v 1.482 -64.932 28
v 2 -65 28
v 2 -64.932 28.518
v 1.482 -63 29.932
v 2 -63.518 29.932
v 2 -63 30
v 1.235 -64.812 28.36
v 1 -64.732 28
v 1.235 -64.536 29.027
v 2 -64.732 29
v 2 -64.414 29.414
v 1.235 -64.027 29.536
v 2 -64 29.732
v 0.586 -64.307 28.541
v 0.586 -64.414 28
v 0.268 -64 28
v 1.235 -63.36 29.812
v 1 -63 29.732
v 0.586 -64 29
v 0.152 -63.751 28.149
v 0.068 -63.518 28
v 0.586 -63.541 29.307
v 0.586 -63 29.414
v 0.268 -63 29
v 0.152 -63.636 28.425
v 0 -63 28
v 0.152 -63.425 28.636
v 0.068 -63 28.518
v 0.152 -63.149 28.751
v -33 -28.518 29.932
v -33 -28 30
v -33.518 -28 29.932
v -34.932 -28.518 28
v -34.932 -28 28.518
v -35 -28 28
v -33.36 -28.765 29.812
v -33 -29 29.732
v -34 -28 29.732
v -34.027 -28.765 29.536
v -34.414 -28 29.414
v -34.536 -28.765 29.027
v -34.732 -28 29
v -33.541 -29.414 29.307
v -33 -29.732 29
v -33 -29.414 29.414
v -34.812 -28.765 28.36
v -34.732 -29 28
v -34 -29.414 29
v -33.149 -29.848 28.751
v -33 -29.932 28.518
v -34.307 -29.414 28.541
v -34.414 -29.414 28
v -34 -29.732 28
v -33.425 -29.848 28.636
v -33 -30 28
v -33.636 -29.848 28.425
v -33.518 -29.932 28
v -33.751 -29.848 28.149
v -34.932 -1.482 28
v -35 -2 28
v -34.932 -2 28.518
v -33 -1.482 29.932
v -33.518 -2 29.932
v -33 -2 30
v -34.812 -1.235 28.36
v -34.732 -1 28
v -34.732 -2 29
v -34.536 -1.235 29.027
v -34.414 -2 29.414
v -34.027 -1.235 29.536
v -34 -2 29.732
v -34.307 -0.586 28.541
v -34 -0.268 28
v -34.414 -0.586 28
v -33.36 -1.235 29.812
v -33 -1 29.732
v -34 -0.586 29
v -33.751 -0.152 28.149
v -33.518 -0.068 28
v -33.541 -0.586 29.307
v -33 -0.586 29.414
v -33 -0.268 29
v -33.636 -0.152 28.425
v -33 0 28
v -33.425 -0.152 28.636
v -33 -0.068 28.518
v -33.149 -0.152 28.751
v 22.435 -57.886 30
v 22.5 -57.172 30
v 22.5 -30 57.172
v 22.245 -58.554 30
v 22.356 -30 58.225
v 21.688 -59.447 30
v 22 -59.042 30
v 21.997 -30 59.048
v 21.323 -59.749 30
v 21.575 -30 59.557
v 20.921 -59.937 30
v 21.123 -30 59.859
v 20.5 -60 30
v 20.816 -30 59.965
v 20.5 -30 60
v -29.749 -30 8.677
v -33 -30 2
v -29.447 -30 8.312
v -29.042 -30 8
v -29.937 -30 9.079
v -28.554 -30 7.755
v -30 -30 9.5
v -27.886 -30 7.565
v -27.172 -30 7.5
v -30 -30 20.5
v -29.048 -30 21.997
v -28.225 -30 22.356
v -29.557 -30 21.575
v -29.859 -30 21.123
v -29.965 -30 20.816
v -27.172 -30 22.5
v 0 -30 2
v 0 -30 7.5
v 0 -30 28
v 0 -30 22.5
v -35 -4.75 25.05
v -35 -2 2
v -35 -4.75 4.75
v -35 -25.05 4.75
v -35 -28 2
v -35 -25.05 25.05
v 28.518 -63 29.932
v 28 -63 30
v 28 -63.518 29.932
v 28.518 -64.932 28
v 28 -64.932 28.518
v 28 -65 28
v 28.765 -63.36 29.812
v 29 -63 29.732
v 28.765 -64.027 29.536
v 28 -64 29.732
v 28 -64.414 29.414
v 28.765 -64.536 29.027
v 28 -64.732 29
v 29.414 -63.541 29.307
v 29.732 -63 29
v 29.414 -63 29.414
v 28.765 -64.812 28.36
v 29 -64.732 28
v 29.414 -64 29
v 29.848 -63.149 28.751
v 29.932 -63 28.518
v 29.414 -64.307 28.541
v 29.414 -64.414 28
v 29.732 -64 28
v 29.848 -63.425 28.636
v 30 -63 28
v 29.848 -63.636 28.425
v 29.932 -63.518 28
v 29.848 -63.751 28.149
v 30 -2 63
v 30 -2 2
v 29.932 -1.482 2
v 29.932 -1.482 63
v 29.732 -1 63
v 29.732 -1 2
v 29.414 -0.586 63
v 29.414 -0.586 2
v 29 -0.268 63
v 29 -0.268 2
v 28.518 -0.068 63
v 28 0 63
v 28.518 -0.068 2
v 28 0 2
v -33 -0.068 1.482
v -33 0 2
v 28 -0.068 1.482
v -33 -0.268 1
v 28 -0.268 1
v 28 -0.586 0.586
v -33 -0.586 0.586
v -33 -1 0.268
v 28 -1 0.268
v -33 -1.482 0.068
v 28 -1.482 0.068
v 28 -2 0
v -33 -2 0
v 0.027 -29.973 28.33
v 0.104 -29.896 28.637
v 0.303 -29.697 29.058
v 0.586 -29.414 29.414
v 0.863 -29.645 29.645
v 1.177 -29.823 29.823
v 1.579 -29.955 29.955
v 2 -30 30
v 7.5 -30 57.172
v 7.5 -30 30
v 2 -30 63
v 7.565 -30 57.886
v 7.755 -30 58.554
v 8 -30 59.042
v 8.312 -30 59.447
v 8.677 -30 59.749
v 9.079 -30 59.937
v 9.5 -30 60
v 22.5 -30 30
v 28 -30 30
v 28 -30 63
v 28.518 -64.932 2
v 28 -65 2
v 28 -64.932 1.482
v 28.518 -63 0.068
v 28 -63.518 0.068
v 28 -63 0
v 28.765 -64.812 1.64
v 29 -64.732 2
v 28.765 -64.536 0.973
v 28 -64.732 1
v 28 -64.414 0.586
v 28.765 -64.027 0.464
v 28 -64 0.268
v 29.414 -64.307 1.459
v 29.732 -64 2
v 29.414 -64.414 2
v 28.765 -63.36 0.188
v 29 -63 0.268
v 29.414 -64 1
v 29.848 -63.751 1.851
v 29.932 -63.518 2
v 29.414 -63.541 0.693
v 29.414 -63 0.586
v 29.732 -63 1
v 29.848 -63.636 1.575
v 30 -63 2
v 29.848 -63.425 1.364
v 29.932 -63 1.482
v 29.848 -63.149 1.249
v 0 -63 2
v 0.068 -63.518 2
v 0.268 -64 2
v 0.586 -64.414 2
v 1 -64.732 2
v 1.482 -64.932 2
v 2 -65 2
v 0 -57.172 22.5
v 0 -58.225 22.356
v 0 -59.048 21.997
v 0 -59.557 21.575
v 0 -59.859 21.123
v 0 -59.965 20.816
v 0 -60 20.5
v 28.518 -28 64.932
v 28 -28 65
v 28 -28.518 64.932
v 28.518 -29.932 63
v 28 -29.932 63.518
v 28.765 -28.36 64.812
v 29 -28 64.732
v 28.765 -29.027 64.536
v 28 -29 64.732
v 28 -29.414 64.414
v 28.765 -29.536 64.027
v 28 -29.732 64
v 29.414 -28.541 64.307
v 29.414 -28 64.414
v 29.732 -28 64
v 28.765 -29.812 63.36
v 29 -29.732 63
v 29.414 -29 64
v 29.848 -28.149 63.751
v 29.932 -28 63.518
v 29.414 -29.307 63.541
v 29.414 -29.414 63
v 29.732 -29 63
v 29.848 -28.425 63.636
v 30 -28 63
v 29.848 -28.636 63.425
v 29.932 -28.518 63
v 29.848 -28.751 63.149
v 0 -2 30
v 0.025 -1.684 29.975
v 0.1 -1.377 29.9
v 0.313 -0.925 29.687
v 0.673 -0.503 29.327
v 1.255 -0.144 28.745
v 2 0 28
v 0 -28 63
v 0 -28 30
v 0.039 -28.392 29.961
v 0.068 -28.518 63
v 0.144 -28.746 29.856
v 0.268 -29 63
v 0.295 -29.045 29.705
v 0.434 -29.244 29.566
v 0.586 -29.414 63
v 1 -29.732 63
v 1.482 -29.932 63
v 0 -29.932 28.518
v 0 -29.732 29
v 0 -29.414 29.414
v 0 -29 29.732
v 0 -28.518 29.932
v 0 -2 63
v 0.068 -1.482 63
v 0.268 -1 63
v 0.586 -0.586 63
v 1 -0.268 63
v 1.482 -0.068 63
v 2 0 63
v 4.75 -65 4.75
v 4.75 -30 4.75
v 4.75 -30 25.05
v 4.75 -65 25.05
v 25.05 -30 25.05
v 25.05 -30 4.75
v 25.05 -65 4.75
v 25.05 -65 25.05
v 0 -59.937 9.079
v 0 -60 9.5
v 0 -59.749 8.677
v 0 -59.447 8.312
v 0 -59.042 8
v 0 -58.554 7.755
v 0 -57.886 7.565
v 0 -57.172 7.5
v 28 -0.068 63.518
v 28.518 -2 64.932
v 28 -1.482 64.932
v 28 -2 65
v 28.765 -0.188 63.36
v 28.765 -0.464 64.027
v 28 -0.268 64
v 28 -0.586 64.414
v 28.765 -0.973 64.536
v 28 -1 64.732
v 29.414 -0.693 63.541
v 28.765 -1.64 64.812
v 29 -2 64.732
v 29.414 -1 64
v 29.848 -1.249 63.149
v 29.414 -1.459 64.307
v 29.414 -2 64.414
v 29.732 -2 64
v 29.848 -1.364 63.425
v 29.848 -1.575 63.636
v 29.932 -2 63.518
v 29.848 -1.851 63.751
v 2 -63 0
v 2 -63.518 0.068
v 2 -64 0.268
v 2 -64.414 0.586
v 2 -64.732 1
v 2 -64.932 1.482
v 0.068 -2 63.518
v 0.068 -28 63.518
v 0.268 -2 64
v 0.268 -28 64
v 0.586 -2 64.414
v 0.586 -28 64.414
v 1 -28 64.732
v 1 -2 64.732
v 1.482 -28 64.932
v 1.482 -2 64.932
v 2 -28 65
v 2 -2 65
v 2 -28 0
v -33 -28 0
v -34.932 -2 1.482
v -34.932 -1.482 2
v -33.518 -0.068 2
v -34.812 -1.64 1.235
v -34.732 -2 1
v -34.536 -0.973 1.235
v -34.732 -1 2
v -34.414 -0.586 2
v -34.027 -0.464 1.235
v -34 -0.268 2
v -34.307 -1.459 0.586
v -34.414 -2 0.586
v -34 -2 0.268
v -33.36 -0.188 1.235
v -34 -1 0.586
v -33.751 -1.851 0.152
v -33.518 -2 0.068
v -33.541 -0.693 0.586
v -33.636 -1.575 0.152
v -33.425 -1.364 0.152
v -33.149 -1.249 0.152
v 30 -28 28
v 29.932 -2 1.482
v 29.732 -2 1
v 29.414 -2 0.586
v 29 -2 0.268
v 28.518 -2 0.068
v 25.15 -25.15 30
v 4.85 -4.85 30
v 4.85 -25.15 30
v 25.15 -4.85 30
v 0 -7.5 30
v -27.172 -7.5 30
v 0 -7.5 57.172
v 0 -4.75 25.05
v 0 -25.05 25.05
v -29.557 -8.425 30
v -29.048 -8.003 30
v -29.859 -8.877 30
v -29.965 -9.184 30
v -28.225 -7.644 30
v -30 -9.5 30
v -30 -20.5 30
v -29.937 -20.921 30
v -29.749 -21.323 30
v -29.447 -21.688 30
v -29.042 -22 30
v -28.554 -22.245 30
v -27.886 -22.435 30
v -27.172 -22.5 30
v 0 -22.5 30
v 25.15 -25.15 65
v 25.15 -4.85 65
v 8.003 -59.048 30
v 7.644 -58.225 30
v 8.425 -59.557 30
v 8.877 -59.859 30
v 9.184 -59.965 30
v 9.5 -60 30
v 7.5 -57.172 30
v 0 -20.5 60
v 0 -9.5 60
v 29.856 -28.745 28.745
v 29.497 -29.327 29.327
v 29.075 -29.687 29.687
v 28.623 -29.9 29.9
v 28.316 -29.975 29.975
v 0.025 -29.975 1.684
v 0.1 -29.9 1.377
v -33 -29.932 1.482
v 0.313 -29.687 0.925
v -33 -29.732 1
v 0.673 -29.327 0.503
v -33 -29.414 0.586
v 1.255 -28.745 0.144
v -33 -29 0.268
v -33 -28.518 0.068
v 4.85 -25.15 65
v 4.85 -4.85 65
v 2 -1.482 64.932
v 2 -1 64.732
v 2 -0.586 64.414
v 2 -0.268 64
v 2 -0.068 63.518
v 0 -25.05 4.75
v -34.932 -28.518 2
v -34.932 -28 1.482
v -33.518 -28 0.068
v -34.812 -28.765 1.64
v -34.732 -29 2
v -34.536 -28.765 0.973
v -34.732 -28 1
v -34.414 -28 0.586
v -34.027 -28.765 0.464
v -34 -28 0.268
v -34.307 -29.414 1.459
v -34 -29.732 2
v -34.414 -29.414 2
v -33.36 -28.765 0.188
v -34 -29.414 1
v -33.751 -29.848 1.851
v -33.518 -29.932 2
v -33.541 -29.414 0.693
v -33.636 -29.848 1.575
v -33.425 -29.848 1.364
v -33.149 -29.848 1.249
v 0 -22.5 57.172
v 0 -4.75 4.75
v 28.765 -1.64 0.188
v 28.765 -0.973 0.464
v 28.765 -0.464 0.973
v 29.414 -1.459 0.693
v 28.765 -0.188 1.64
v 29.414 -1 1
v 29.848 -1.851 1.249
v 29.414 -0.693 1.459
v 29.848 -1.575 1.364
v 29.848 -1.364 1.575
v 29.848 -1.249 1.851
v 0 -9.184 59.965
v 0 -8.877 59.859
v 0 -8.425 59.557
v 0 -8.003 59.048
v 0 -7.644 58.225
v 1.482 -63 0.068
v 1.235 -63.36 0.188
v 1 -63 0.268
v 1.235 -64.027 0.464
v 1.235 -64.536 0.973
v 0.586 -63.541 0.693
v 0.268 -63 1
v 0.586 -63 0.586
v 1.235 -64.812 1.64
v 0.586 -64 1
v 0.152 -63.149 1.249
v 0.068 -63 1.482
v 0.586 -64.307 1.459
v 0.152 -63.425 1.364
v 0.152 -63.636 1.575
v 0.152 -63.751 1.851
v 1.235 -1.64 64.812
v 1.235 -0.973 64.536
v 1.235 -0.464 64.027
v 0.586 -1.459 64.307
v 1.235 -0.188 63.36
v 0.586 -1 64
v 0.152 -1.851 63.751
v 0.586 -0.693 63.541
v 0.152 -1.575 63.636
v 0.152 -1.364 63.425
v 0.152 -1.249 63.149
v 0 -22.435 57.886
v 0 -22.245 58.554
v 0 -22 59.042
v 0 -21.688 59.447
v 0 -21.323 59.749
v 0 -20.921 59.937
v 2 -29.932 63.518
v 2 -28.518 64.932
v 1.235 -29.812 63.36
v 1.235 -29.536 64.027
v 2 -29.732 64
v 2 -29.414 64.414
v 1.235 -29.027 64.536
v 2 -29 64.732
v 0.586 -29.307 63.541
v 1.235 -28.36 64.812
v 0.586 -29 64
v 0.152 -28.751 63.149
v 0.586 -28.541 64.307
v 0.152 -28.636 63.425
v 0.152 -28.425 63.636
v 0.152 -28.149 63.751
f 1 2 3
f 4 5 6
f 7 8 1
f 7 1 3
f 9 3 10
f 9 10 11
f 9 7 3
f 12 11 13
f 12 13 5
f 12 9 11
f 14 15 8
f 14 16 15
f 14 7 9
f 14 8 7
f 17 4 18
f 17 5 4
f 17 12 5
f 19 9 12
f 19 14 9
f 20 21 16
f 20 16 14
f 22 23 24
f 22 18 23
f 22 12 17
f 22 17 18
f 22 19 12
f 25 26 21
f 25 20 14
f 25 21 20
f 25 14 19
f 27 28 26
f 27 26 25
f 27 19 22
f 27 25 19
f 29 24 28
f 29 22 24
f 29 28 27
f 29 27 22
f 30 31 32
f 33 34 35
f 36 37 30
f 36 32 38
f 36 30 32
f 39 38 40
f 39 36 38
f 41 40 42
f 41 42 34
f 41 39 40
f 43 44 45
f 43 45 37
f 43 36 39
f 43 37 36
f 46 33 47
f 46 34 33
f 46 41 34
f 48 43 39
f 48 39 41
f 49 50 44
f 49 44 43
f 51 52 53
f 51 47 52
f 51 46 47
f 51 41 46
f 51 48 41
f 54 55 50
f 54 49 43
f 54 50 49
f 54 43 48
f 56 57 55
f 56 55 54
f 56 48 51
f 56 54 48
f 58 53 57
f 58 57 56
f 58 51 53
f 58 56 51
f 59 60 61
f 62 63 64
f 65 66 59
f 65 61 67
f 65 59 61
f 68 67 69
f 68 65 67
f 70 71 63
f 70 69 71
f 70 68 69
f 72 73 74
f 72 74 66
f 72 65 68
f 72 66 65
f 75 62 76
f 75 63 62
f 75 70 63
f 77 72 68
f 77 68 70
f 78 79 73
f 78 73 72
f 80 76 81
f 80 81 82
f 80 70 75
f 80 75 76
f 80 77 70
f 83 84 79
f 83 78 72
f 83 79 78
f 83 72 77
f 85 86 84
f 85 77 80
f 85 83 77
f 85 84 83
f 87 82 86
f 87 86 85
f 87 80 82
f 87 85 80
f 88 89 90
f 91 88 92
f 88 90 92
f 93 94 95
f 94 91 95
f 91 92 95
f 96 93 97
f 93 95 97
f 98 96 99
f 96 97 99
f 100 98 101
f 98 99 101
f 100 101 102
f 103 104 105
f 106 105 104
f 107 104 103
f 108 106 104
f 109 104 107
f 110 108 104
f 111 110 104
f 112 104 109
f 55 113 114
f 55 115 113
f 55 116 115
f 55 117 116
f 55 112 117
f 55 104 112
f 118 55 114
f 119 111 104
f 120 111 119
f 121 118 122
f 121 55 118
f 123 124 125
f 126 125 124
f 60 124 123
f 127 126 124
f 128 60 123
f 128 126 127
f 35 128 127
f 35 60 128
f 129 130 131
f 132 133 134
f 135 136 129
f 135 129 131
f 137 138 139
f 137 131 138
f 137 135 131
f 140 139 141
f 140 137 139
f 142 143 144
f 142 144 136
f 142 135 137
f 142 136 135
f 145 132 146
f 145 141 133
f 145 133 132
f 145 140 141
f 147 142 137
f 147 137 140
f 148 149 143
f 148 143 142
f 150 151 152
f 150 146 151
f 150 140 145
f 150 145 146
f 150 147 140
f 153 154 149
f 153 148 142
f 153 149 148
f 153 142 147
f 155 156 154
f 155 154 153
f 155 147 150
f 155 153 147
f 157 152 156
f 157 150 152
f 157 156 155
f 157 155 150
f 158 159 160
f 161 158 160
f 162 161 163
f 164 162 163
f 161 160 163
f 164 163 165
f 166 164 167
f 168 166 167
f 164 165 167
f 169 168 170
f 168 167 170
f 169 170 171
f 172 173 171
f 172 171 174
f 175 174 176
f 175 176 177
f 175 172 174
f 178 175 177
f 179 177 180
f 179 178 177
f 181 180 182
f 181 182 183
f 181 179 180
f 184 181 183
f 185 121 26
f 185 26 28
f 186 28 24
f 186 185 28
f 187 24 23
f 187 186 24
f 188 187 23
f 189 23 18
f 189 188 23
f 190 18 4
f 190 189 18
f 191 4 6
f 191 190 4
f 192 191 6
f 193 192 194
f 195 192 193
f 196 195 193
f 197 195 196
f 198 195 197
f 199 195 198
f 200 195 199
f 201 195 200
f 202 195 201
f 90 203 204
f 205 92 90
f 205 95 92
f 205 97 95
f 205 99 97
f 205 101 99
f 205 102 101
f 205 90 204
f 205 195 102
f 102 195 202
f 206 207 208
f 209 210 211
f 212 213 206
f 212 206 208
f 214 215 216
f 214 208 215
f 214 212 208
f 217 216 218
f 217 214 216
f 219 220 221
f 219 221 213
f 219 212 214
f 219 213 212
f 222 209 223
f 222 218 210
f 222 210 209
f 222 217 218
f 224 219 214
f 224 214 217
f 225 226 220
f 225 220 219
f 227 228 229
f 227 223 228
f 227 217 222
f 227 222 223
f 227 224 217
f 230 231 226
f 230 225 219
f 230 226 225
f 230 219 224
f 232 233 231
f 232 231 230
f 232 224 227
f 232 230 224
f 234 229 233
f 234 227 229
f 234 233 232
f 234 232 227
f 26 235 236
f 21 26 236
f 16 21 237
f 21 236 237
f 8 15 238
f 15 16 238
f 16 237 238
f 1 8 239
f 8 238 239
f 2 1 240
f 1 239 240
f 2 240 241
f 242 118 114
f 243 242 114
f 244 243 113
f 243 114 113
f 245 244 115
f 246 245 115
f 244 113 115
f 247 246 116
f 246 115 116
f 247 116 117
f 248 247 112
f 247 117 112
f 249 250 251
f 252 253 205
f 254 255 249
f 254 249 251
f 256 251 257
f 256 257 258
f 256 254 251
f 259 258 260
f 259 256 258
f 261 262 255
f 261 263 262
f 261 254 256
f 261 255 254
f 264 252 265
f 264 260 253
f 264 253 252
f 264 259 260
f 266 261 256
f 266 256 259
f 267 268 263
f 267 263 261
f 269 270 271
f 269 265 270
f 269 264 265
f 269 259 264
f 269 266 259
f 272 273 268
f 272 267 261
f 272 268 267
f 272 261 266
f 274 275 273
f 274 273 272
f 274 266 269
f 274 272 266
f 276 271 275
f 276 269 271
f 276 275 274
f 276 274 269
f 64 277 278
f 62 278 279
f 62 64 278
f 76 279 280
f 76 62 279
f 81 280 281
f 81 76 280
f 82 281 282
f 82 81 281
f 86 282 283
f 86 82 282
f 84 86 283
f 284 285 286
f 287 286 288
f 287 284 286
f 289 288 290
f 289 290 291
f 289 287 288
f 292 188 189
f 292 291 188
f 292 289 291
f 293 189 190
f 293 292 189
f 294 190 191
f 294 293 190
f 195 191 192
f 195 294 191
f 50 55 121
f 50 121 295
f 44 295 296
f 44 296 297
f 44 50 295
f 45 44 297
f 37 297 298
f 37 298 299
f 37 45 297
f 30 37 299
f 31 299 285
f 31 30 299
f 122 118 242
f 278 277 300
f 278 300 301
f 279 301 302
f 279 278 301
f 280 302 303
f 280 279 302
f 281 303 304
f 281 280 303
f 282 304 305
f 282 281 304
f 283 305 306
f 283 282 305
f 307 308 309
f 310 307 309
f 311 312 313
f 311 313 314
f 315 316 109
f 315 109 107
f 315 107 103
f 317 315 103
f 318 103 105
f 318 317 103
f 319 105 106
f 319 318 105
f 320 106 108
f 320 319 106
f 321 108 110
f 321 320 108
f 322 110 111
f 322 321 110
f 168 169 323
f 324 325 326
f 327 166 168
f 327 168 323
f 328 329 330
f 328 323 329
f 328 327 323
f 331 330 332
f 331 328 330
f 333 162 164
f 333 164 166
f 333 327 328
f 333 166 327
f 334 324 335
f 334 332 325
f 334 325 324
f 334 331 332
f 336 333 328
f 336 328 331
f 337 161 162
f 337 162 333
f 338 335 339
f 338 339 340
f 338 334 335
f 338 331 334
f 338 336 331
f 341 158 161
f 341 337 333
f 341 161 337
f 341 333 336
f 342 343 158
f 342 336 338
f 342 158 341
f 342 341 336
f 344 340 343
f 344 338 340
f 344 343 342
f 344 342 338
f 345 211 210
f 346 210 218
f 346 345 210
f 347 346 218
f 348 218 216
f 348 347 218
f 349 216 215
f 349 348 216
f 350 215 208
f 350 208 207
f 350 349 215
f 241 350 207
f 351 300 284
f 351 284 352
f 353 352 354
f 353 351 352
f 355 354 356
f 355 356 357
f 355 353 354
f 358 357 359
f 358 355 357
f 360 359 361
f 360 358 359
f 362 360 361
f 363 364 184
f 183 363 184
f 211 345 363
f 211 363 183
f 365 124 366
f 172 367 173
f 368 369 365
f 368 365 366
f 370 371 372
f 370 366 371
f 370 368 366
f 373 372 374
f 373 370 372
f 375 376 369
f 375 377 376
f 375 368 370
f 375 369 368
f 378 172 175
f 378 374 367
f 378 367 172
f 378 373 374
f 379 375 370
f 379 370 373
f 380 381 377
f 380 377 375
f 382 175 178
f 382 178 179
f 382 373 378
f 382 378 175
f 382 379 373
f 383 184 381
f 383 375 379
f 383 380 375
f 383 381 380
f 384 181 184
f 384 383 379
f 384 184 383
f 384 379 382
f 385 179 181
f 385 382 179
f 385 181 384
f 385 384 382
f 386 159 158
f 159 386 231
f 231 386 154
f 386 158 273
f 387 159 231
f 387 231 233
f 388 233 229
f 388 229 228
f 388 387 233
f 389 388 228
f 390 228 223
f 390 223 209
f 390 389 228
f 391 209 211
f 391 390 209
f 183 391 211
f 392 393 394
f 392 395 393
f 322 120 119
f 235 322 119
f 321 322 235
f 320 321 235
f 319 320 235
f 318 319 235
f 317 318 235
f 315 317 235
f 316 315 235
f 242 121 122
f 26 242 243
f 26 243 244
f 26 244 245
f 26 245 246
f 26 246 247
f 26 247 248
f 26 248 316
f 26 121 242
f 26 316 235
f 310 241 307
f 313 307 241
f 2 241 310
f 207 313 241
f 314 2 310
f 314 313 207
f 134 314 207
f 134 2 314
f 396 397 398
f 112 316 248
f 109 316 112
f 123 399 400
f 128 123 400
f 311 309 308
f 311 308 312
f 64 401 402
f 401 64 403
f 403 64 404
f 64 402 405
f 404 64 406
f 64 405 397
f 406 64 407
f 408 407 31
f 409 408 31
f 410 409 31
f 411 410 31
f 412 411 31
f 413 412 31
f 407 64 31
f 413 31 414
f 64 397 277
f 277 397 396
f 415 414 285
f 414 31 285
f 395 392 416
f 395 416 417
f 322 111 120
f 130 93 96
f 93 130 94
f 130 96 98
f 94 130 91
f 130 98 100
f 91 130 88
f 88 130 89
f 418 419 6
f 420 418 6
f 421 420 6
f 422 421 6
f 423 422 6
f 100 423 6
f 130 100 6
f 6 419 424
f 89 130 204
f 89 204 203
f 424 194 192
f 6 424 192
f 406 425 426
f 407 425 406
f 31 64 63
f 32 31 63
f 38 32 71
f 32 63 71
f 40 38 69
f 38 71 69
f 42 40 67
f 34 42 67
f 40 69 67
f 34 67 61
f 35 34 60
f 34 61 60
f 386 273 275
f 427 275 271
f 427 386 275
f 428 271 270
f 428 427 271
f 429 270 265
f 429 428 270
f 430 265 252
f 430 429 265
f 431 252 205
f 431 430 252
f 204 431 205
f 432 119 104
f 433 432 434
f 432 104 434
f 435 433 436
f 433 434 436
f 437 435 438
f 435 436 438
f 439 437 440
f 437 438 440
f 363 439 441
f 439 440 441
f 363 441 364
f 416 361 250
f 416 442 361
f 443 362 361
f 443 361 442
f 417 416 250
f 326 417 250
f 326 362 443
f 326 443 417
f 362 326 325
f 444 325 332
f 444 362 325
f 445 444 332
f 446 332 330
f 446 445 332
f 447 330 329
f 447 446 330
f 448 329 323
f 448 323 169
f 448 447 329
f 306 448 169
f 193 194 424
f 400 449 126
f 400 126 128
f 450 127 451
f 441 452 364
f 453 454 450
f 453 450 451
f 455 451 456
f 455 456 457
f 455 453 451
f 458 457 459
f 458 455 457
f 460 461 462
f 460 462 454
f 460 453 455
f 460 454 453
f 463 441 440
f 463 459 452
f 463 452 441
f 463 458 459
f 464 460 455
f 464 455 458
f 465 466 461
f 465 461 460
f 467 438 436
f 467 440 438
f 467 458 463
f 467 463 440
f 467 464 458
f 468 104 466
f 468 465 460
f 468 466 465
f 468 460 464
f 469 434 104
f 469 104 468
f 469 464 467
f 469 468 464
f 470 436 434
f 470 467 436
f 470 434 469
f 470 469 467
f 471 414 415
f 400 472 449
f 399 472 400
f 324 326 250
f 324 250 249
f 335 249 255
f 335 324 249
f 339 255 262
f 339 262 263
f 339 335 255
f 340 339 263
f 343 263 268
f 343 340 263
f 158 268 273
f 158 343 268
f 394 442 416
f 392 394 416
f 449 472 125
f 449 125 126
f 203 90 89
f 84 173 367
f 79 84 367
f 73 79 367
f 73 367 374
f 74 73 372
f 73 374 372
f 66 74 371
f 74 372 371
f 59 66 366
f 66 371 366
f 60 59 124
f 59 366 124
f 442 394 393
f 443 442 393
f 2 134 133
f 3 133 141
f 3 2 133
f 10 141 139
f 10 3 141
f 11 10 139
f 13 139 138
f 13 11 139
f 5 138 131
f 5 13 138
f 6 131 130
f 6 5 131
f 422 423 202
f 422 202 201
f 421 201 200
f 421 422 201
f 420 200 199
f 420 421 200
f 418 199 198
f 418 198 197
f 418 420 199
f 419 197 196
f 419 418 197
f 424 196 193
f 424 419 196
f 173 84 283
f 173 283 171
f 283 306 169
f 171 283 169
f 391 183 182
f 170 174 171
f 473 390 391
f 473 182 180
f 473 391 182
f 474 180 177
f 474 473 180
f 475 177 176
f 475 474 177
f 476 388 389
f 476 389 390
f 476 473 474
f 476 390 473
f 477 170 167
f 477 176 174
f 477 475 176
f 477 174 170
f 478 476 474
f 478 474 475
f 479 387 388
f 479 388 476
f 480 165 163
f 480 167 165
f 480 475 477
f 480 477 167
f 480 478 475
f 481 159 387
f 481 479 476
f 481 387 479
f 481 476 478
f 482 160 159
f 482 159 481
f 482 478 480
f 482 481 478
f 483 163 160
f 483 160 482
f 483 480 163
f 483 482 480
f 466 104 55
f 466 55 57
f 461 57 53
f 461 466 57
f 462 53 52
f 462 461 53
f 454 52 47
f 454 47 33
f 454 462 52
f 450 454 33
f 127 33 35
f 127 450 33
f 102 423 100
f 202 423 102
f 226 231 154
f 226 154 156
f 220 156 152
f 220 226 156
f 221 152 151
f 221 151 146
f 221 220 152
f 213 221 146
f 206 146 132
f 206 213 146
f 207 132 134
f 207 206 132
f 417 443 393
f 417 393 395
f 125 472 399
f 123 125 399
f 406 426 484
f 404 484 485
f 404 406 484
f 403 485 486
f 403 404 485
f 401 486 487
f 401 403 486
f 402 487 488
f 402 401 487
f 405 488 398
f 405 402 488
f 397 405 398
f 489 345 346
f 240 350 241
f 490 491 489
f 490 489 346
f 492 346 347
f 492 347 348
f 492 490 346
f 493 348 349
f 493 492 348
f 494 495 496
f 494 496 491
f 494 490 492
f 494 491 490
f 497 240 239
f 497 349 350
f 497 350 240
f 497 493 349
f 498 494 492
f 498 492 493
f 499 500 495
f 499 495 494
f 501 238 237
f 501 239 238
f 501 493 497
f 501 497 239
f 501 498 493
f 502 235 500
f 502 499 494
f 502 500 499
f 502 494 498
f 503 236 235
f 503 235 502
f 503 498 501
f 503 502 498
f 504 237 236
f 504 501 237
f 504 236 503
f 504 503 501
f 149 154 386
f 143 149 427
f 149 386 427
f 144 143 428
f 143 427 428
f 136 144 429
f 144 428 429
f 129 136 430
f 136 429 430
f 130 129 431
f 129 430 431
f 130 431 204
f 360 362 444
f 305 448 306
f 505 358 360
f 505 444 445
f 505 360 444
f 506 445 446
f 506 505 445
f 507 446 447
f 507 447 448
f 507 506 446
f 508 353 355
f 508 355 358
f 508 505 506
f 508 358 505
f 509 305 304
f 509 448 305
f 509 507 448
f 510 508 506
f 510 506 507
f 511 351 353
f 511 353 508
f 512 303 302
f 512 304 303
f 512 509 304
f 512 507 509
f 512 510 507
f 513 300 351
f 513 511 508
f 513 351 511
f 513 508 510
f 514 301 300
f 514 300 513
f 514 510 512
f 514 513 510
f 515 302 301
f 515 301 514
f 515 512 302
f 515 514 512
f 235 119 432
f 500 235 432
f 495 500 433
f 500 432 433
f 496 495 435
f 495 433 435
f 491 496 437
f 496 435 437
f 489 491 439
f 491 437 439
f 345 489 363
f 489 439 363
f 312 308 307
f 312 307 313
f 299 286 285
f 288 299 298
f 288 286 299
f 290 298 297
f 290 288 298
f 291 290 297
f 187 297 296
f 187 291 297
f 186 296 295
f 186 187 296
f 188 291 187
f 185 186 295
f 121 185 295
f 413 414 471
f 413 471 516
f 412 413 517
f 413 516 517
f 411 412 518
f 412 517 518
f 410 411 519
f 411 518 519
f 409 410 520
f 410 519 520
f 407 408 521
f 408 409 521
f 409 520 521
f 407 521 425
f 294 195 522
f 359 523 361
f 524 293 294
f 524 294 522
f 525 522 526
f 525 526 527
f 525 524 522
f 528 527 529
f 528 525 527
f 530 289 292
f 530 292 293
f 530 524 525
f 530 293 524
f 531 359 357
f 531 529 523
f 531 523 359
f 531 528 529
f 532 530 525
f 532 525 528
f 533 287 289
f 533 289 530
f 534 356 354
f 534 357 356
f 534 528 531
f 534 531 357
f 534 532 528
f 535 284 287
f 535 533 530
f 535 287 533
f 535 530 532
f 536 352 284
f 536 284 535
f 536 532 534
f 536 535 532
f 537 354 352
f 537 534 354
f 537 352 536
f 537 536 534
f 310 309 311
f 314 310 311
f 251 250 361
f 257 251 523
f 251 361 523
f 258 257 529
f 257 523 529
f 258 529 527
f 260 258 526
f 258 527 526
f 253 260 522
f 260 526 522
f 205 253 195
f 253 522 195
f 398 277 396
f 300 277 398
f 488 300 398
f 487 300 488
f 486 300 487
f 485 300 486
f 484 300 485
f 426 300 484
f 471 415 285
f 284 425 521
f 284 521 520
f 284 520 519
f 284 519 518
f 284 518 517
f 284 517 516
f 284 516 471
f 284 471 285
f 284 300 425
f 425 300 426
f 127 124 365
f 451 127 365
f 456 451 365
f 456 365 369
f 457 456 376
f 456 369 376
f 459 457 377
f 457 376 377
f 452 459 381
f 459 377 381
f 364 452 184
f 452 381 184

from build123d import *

# Parameters (mm, degrees)
F0_W           = 30
F0_H           = 30
F1_DEPTH       = 30
F2_W           = 30
F2_H           = 30
F2_W_2         = 20.3
F2_H_2         = 20.3
F3_DEPTH       = 35
F4_W           = 30
F4_H           = 30
F4_W_2         = 20.3
F4_H_2         = 20.3
F5_DEPTH       = 35
F6_W           = 30
F6_H           = 30
F6_W_2         = 20.3
F6_H_2         = 20.3
F7_DEPTH       = 35
F9_DEPTH       = 30
F10_W          = 7.5
F10_H          = 30
F11_DEPTH      = 35
F13_DEPTH      = 30
F15_DEPTH      = 35
F17_DEPTH      = 30
F18_W          = 35
F18_H          = 7.5
F19_DEPTH      = 35
F20_T1_DEPTH   = 26
F20_T3_DEPTH   = 26
F20_T5_DEPTH   = 33
F20_T7_DEPTH   = 33
F20_T9_DEPTH   = 26
F20_T11_DEPTH  = 33
F20_T13_DEPTH  = 61
F20_T15_DEPTH  = 61
F20_T17_DEPTH  = 33
F20_T19_DEPTH  = 33
F20_T21_DEPTH  = 33
F20_T23_DEPTH  = 61
F20_S27_W      = 2
F20_S27_H      = 2
F20_T28_DEPTH  = 2
F20_S33_W      = 2
F20_S33_H      = 2
F20_T34_DEPTH  = 2
F20_S39_W      = 2
F20_S39_H      = 2
F20_T40_DEPTH  = 2
F20_S45_W      = 2
F20_S45_H      = 2
F20_T46_DEPTH  = 2
F20_S51_W      = 2
F20_S51_H      = 2
F20_T52_DEPTH  = 2
F20_S57_W      = 2
F20_S57_H      = 2
F20_T58_DEPTH  = 2
F20_S63_W      = 2
F20_S63_H      = 2
F20_T64_DEPTH  = 2
F20_S69_W      = 2
F20_S69_H      = 2
F20_T70_DEPTH  = 2
F20_S75_W      = 2
F20_S75_H      = 2
F20_T76_DEPTH  = 2
F20_S81_W      = 2
F20_S81_H      = 2
F20_T82_DEPTH  = 2
F20_S87_W      = 2
F20_S87_H      = 2
F20_T88_DEPTH  = 2
F20_T94_DEPTH  = 52.4264068712
F20_T100_DEPTH = 52.4264068712
F20_T106_DEPTH = 52.4264068712
F20_T112_DEPTH = 52.4264068712
F20_T118_DEPTH = 52.4264068712
F20_T124_DEPTH = 52.4264068712
F20_T131_DEPTH = 38
F20_T135_DEPTH = 38
F20_T142_DEPTH = 38
F20_T146_DEPTH = 38
F20_T153_DEPTH = 38
F20_T157_DEPTH = 38
F21_T1_DEPTH   = 33
F21_T3_DEPTH   = 33
F21_S7_W       = 2
F21_S7_H       = 2
F21_T8_DEPTH   = 2
F21_S13_W      = 2
F21_S13_H      = 2
F21_T14_DEPTH  = 2
F21_T21_DEPTH  = 38
F21_S23_R      = 1.9999999999
F21_T24_DEPTH  = 21
F21_T27_DEPTH  = 38
F21_S28_R      = 1.9999999999
F21_T29_DEPTH  = 21


# Not quite as in the source:
# - a fillet or chamfer that OpenCascade refuses, or shapes differently, is made with other operations: its cross-section is extruded or revolved along the edge and cut away or added


with BuildPart() as f1:
    # F0 (on Front) → F1 (new body)
    with BuildSketch(Plane.XZ):
        with Locations((15, 15)):
            Rectangle(F0_W, F0_H)
    extrude(amount=F1_DEPTH)

    # F2 (on face) → F3 (join)
    with BuildSketch(Plane.XZ.offset(30)):
        with Locations((15, 15)):
            Rectangle(F2_W, F2_H)
        with Locations((14.9, 14.9)):
            Rectangle(F2_W_2, F2_H_2, mode=Mode.SUBTRACT)
    extrude(amount=F3_DEPTH)

    # F4 (on face) → F5 (join)
    with BuildSketch(Plane(origin=(0, 0, 0), x_dir=(0, -1, 0), z_dir=(-1, 0, 0))):
        with Locations((15, 15)):
            Rectangle(F4_W, F4_H)
        with Locations((14.9, 14.9)):
            Rectangle(F4_W_2, F4_H_2, mode=Mode.SUBTRACT)
    extrude(amount=F5_DEPTH)

    # F6 (on face) → F7 (join)
    with BuildSketch(Plane.XY.offset(30)):
        with Locations((15, -15)):
            Rectangle(F6_W, F6_H)
        with Locations((15, -15)):
            Rectangle(F6_W_2, F6_H_2, mode=Mode.SUBTRACT)
    extrude(amount=F7_DEPTH)

    # F8 (on face) → F9 (join)
    with BuildSketch(Plane.XZ.offset(30)):
        Polygon((-30, 30), (0, 30), (0, 60), align=None)
    extrude(amount=-F9_DEPTH)

    # F10 (on face) → F11 (cut)
    with BuildSketch(Plane(origin=(-35, 0, 0), x_dir=(0, -1, 0), z_dir=(-1, 0, 0))):
        with Locations((3.75, 45)):
            Rectangle(F10_W, F10_H)
        with Locations((26.25, 45)):
            Rectangle(F10_W, F10_H)
    extrude(amount=-F11_DEPTH, mode=Mode.SUBTRACT)

    # F12 (on face) → F13 (join)
    with BuildSketch(Plane(origin=(0, 0, 0), x_dir=(0, -1, 0), z_dir=(-1, 0, 0))):
        Polygon((30, 60), (30, 30), (60, 30), align=None)
    extrude(amount=-F13_DEPTH)

    # F14 (on face) → F15 (cut)
    with BuildSketch(Plane.XZ.offset(65)):
        Polygon((22.5, 60), (22.5, 30), (30, 30), (30, 65), (0, 65), (0, 30), (7.5, 30), (7.5, 60), align=None)
    extrude(amount=-F15_DEPTH, mode=Mode.SUBTRACT)

    # F16 (on face) → F17 (join)
    with BuildSketch(Plane(origin=(0, 0, 0), x_dir=(1, 0, 0), z_dir=(0, 0, -1))):
        Polygon((-30, 30), (0, 30), (0, 60), align=None)
    extrude(amount=-F17_DEPTH)

    # F18 (on face) → F19 (cut)
    with BuildSketch(Plane(origin=(-35, 0, 0), x_dir=(0, -1, 0), z_dir=(-1, 0, 0))):
        with Locations((47.5, 26.25)):
            Rectangle(F18_W, F18_H)
        with Locations((47.5, 3.75)):
            Rectangle(F18_W, F18_H)
    extrude(amount=-F19_DEPTH, mode=Mode.SUBTRACT)

    # F20: fillet of radius 2 on 28 edges, made by hand

    # F20_s2 → F20_t1 (cut)
    with BuildSketch(Plane.XZ.offset(2)):
        with BuildLine():
            ThreePointArc((-33, 30), (-34.4142135624, 29.4142135624), (-35, 28))
            Line((-35, 28), (-35, 30))
            Line((-35, 30), (-33, 30))
        make_face()
        with BuildLine():
            ThreePointArc((-35, 2), (-34.4142135624, 0.5857864376), (-33, 0))
            Line((-33, 0), (-35, 0))
            Line((-35, 0), (-35, 2))
        make_face()
        with BuildLine():
            ThreePointArc((28, 65), (29.4142135624, 64.4142135624), (30, 63))
            Line((30, 63), (30, 65))
            Line((30, 65), (28, 65))
        make_face()
    extrude(amount=F20_T1_DEPTH, mode=Mode.SUBTRACT)

    # F20_s4 → F20_t3 (cut)
    with BuildSketch(Plane.XY.offset(2)):
        with BuildLine():
            ThreePointArc((-33, -30), (-34.4142135624, -29.4142135624), (-35, -28))
            Line((-35, -28), (-35, -30))
            Line((-35, -30), (-33, -30))
        make_face()
        with BuildLine():
            ThreePointArc((-33, 0), (-34.4142135624, -0.5857864376), (-35, -2))
            Line((-35, -2), (-35, 0))
            Line((-35, 0), (-33, 0))
        make_face()
        with BuildLine():
            ThreePointArc((30, -63), (29.4142135624, -64.4142135624), (28, -65))
            Line((28, -65), (30, -65))
            Line((30, -65), (30, -63))
        make_face()
    extrude(amount=F20_T3_DEPTH, mode=Mode.SUBTRACT)

    # F20_s6 → F20_t5 (cut)
    with BuildSketch(Plane.XY.offset(2)):
        with BuildLine():
            ThreePointArc((0, -63), (0.5857864376, -64.4142135624), (2, -65))
            Line((2, -65), (0, -65))
            Line((0, -65), (0, -63))
        make_face()
    extrude(amount=F20_T5_DEPTH, mode=Mode.SUBTRACT)

    # F20_s8 → F20_t7 (cut)
    with BuildSketch(Plane.YZ.offset(-5)):
        with BuildLine():
            ThreePointArc((-65, 28), (-64.4142135624, 29.4142135624), (-63, 30))
            Line((-63, 30), (-65, 30))
            Line((-65, 30), (-65, 28))
        make_face()
        with BuildLine():
            ThreePointArc((-28, 65), (-29.4142135624, 64.4142135624), (-30, 63))
            Line((-30, 63), (-30, 65))
            Line((-30, 65), (-28, 65))
        make_face()
    extrude(amount=F20_T7_DEPTH, mode=Mode.SUBTRACT)

    # F20_s10 → F20_t9 (cut)
    with BuildSketch(Plane.YZ.offset(2)):
        with BuildLine():
            ThreePointArc((-63, 0), (-64.4142135624, 0.5857864376), (-65, 2))
            Line((-65, 2), (-65, 0))
            Line((-65, 0), (-63, 0))
        make_face()
        with BuildLine():
            ThreePointArc((-2, 65), (-0.5857864376, 64.4142135624), (0, 63))
            Line((0, 63), (0, 65))
            Line((0, 65), (-2, 65))
        make_face()
    extrude(amount=F20_T9_DEPTH, mode=Mode.SUBTRACT)

    # F20_s12 → F20_t11 (cut)
    with BuildSketch(Plane.XZ.offset(2)):
        with BuildLine():
            ThreePointArc((0, 63), (0.5857864376, 64.4142135624), (2, 65))
            Line((2, 65), (0, 65))
            Line((0, 65), (0, 63))
        make_face()
    extrude(amount=F20_T11_DEPTH, mode=Mode.SUBTRACT)

    # F20_s14 → F20_t13 (cut)
    with BuildSketch(Plane.XY.offset(2)):
        with BuildLine():
            ThreePointArc((30, -2), (29.4142135624, -0.5857864376), (28, 0))
            Line((28, 0), (30, 0))
            Line((30, 0), (30, -2))
        make_face()
    extrude(amount=F20_T13_DEPTH, mode=Mode.SUBTRACT)

    # F20_s16 → F20_t15 (cut)
    with BuildSketch(Plane.XZ.offset(2)):
        with BuildLine():
            ThreePointArc((30, 2), (29.4142135624, 0.5857864376), (28, 0))
            Line((28, 0), (30, 0))
            Line((30, 0), (30, 2))
        make_face()
    extrude(amount=F20_T15_DEPTH, mode=Mode.SUBTRACT)

    # F20_s18 → F20_t17 (cut)
    with BuildSketch(Plane.XZ.offset(30)):
        with BuildLine():
            ThreePointArc((30, 28), (29.4142135624, 29.4142135624), (28, 30))
            Line((28, 30), (30, 30))
            Line((30, 30), (30, 28))
        make_face()
        with BuildLine():
            ThreePointArc((0, 2), (0.5857864376, 0.5857864376), (2, 0))
            Line((2, 0), (0, 0))
            Line((0, 0), (0, 2))
        make_face()
    extrude(amount=F20_T17_DEPTH, mode=Mode.SUBTRACT)

    # F20_s20 → F20_t19 (cut)
    with BuildSketch(Plane.XY.offset(30)):
        with BuildLine():
            ThreePointArc((30, -28), (29.4142135624, -29.4142135624), (28, -30))
            Line((28, -30), (30, -30))
            Line((30, -30), (30, -28))
        make_face()
        with BuildLine():
            ThreePointArc((0, -2), (0.5857864376, -0.5857864376), (2, 0))
            Line((2, 0), (0, 0))
            Line((0, 0), (0, -2))
        make_face()
    extrude(amount=F20_T19_DEPTH, mode=Mode.SUBTRACT)

    # F20_s22 → F20_t21 (cut)
    with BuildSketch(Plane.YZ.offset(-33)):
        with BuildLine():
            ThreePointArc((-30, 2), (-29.4142135624, 0.5857864376), (-28, 0))
            Line((-28, 0), (-30, 0))
            Line((-30, 0), (-30, 2))
        make_face()
        with BuildLine():
            ThreePointArc((-2, 30), (-0.5857864376, 29.4142135624), (0, 28))
            Line((0, 28), (0, 30))
            Line((0, 30), (-2, 30))
        make_face()
        with BuildLine():
            ThreePointArc((-30, 28), (-29.4142135624, 29.4142135624), (-28, 30))
            Line((-28, 30), (-30, 30))
            Line((-30, 30), (-30, 28))
        make_face()
    extrude(amount=F20_T21_DEPTH, mode=Mode.SUBTRACT)

    # F20_s24 → F20_t23 (cut)
    with BuildSketch(Plane.YZ.offset(-33)):
        with BuildLine():
            ThreePointArc((0, 2), (-0.5857864376, 0.5857864376), (-2, 0))
            Line((-2, 0), (0, 0))
            Line((0, 0), (0, 2))
        make_face()
    extrude(amount=F20_T23_DEPTH, mode=Mode.SUBTRACT)


with BuildPart() as f20_tool26:
    # F20_s27 → F20_t28 (new body)
    with BuildSketch(Plane.XZ.offset(2)):
        with Locations((-34, 29)):
            Rectangle(F20_S27_W, F20_S27_H)
    extrude(amount=-F20_T28_DEPTH)

    # F20_s29 → F20_t30 (revolve, cut)
    with BuildSketch(Plane(origin=(-33, -2, 28), x_dir=(0.7071067812, 0, -0.7071067812), z_dir=(0.7071067812, 0, 0.7071067812))):
        with BuildLine():
            ThreePointArc((0, -2), (2, 0), (0, 2))
            Line((0, 2), (0, -2))
        make_face()
    revolve(axis=Axis((-33, -2, 28), (0, 1, 0)), mode=Mode.SUBTRACT)


with BuildPart() as f1_1:
    add(f1.part)

    # F20_t25: cut F20_tool26
    add(f20_tool26.part, mode=Mode.SUBTRACT)


with BuildPart() as f20_tool32:
    # F20_s33 → F20_t34 (new body)
    with BuildSketch(Plane.XZ.offset(28)):
        with Locations((-34, 29)):
            Rectangle(F20_S33_W, F20_S33_H)
    extrude(amount=F20_T34_DEPTH)

    # F20_s35 → F20_t36 (revolve, cut)
    with BuildSketch(Plane(origin=(-33, -28, 28), x_dir=(0.7071067812, 0, -0.7071067812), z_dir=(-0.7071067812, 0, -0.7071067812))):
        with BuildLine():
            ThreePointArc((0, -2), (2, 0), (0, 2))
            Line((0, 2), (0, -2))
        make_face()
    revolve(axis=Axis((-33, -28, 28), (0, -1, 0)), mode=Mode.SUBTRACT)


with BuildPart() as f1_2:
    add(f1_1.part)

    # F20_t31: cut F20_tool32
    add(f20_tool32.part, mode=Mode.SUBTRACT)


with BuildPart() as f20_tool38:
    # F20_s39 → F20_t40 (new body)
    with BuildSketch(Plane.XZ.offset(28)):
        with Locations((-34, 1)):
            Rectangle(F20_S39_W, F20_S39_H)
    extrude(amount=F20_T40_DEPTH)

    # F20_s41 → F20_t42 (revolve, cut)
    with BuildSketch(Plane(origin=(-33, -28, 2), x_dir=(0.7071067812, 0, 0.7071067812), z_dir=(0.7071067812, 0, -0.7071067812))):
        with BuildLine():
            ThreePointArc((0, -2), (2, 0), (0, 2))
            Line((0, 2), (0, -2))
        make_face()
    revolve(axis=Axis((-33, -28, 2), (0, -1, 0)), mode=Mode.SUBTRACT)


with BuildPart() as f1_3:
    add(f1_2.part)

    # F20_t37: cut F20_tool38
    add(f20_tool38.part, mode=Mode.SUBTRACT)


with BuildPart() as f20_tool44:
    # F20_s45 → F20_t46 (new body)
    with BuildSketch(Plane.XY.offset(2)):
        with Locations((-34, -1)):
            Rectangle(F20_S45_W, F20_S45_H)
    extrude(amount=-F20_T46_DEPTH)

    # F20_s47 → F20_t48 (revolve, cut)
    with BuildSketch(Plane(origin=(-33, -2, 2), x_dir=(0.7071067812, -0.7071067812, 0), z_dir=(0.7071067812, 0.7071067812, 0))):
        with BuildLine():
            ThreePointArc((0, -2), (2, 0), (0, 2))
            Line((0, 2), (0, -2))
        make_face()
    revolve(axis=Axis((-33, -2, 2), (0, 0, -1)), mode=Mode.SUBTRACT)


with BuildPart() as f1_4:
    add(f1_3.part)

    # F20_t43: cut F20_tool44
    add(f20_tool44.part, mode=Mode.SUBTRACT)


with BuildPart() as f20_tool50:
    # F20_s51 → F20_t52 (new body)
    with BuildSketch(Plane.YZ.offset(2)):
        with Locations((-64, 1)):
            Rectangle(F20_S51_W, F20_S51_H)
    extrude(amount=-F20_T52_DEPTH)

    # F20_s53 → F20_t54 (revolve, cut)
    with BuildSketch(Plane(origin=(2, -63, 2), x_dir=(0, 0.7071067812, 0.7071067812), z_dir=(0, -0.7071067812, 0.7071067812))):
        with BuildLine():
            ThreePointArc((0, -2), (2, 0), (0, 2))
            Line((0, 2), (0, -2))
        make_face()
    revolve(axis=Axis((2, -63, 2), (-1, 0, 0)), mode=Mode.SUBTRACT)


with BuildPart() as f1_5:
    add(f1_4.part)

    # F20_t49: cut F20_tool50
    add(f20_tool50.part, mode=Mode.SUBTRACT)


with BuildPart() as f20_tool56:
    # F20_s57 → F20_t58 (new body)
    with BuildSketch(Plane.YZ.offset(28)):
        with Locations((-64, 29)):
            Rectangle(F20_S57_W, F20_S57_H)
    extrude(amount=F20_T58_DEPTH)

    # F20_s59 → F20_t60 (revolve, cut)
    with BuildSketch(Plane(origin=(28, -63, 28), x_dir=(0, 0.7071067812, -0.7071067812), z_dir=(0, -0.7071067812, -0.7071067812))):
        with BuildLine():
            ThreePointArc((0, -2), (2, 0), (0, 2))
            Line((0, 2), (0, -2))
        make_face()
    revolve(axis=Axis((28, -63, 28), (1, 0, 0)), mode=Mode.SUBTRACT)


with BuildPart() as f1_6:
    add(f1_5.part)

    # F20_t55: cut F20_tool56
    add(f20_tool56.part, mode=Mode.SUBTRACT)


with BuildPart() as f20_tool62:
    # F20_s63 → F20_t64 (new body)
    with BuildSketch(Plane.YZ.offset(28)):
        with Locations((-64, 1)):
            Rectangle(F20_S63_W, F20_S63_H)
    extrude(amount=F20_T64_DEPTH)

    # F20_s65 → F20_t66 (revolve, cut)
    with BuildSketch(Plane(origin=(28, -63, 2), x_dir=(0, 0.7071067812, 0.7071067812), z_dir=(0, 0.7071067812, -0.7071067812))):
        with BuildLine():
            ThreePointArc((0, -2), (2, 0), (0, 2))
            Line((0, 2), (0, -2))
        make_face()
    revolve(axis=Axis((28, -63, 2), (1, 0, 0)), mode=Mode.SUBTRACT)


with BuildPart() as f1_7:
    add(f1_6.part)

    # F20_t61: cut F20_tool62
    add(f20_tool62.part, mode=Mode.SUBTRACT)


with BuildPart() as f20_tool68:
    # F20_s69 → F20_t70 (new body)
    with BuildSketch(Plane.YZ.offset(28)):
        with Locations((-29, 64)):
            Rectangle(F20_S69_W, F20_S69_H)
    extrude(amount=F20_T70_DEPTH)

    # F20_s71 → F20_t72 (revolve, cut)
    with BuildSketch(Plane(origin=(28, -28, 63), x_dir=(0, 0.7071067812, -0.7071067812), z_dir=(0, -0.7071067812, -0.7071067812))):
        with BuildLine():
            ThreePointArc((0, -2), (2, 0), (0, 2))
            Line((0, 2), (0, -2))
        make_face()
    revolve(axis=Axis((28, -28, 63), (1, 0, 0)), mode=Mode.SUBTRACT)


with BuildPart() as f1_8:
    add(f1_7.part)

    # F20_t67: cut F20_tool68
    add(f20_tool68.part, mode=Mode.SUBTRACT)


with BuildPart() as f20_tool74:
    # F20_s75 → F20_t76 (new body)
    with BuildSketch(Plane.YZ.offset(28)):
        with Locations((-1, 64)):
            Rectangle(F20_S75_W, F20_S75_H)
    extrude(amount=F20_T76_DEPTH)

    # F20_s77 → F20_t78 (revolve, cut)
    with BuildSketch(Plane(origin=(28, -2, 63), x_dir=(0, -0.7071067812, -0.7071067812), z_dir=(0, -0.7071067812, 0.7071067812))):
        with BuildLine():
            ThreePointArc((0, -2), (2, 0), (0, 2))
            Line((0, 2), (0, -2))
        make_face()
    revolve(axis=Axis((28, -2, 63), (1, 0, 0)), mode=Mode.SUBTRACT)


with BuildPart() as f1_9:
    add(f1_8.part)

    # F20_t73: cut F20_tool74
    add(f20_tool74.part, mode=Mode.SUBTRACT)


with BuildPart() as f20_tool80:
    # F20_s81 → F20_t82 (new body)
    with BuildSketch(Plane.YZ.offset(2)):
        with Locations((-1, 64)):
            Rectangle(F20_S81_W, F20_S81_H)
    extrude(amount=-F20_T82_DEPTH)

    # F20_s83 → F20_t84 (revolve, cut)
    with BuildSketch(Plane(origin=(2, -2, 63), x_dir=(0, -0.7071067812, -0.7071067812), z_dir=(0, 0.7071067812, -0.7071067812))):
        with BuildLine():
            ThreePointArc((0, -2), (2, 0), (0, 2))
            Line((0, 2), (0, -2))
        make_face()
    revolve(axis=Axis((2, -2, 63), (-1, 0, 0)), mode=Mode.SUBTRACT)


with BuildPart() as f1_10:
    add(f1_9.part)

    # F20_t79: cut F20_tool80
    add(f20_tool80.part, mode=Mode.SUBTRACT)


with BuildPart() as f20_tool86:
    # F20_s87 → F20_t88 (new body)
    with BuildSketch(Plane.YZ.offset(28)):
        with Locations((-1, 1)):
            Rectangle(F20_S87_W, F20_S87_H)
    extrude(amount=F20_T88_DEPTH)

    # F20_s89 → F20_t90 (revolve, cut)
    with BuildSketch(Plane(origin=(28, -2, 2), x_dir=(0, -0.7071067812, 0.7071067812), z_dir=(0, 0.7071067812, 0.7071067812))):
        with BuildLine():
            ThreePointArc((0, -2), (2, 0), (0, 2))
            Line((0, 2), (0, -2))
        make_face()
    revolve(axis=Axis((28, -2, 2), (1, 0, 0)), mode=Mode.SUBTRACT)


with BuildPart() as f1_11:
    add(f1_10.part)

    # F20_t85: cut F20_tool86
    add(f20_tool86.part, mode=Mode.SUBTRACT)


with BuildPart() as f20_tool92:
    # F20_s93 → F20_t94 (new body)
    with BuildSketch(Plane(origin=(0, -18.5355339059, -18.5355339059), x_dir=(1, 0, 0), z_dir=(0, 0.7071067812, 0.7071067812))):
        with BuildLine():
            ThreePointArc((9.5, -63.6396103068), (8.0857864376, -63.0538238692), (7.5, -61.6396103068))
            Line((7.5, -61.6396103068), (7.5, -63.6396103068))
            Line((7.5, -63.6396103068), (9.5, -63.6396103068))
        make_face()
    extrude(amount=F20_T94_DEPTH)

    split(bisect_by=Plane.XZ.offset(30), keep=Keep.TOP)

    split(bisect_by=Plane.XY.offset(30), keep=Keep.TOP)


with BuildPart() as f1_12:
    add(f1_11.part)

    # F20_t91: cut F20_tool92
    add(f20_tool92.part, mode=Mode.SUBTRACT)


with BuildPart() as f20_tool98:
    # F20_s99 → F20_t100 (new body)
    with BuildSketch(Plane(origin=(0, 18.5355339059, 18.5355339059), x_dir=(1, 0, 0), z_dir=(0, -0.7071067812, -0.7071067812))):
        with BuildLine():
            ThreePointArc((22.5, 61.6396103068), (21.9142135624, 63.0538238692), (20.5, 63.6396103068))
            Line((20.5, 63.6396103068), (22.5, 63.6396103068))
            Line((22.5, 63.6396103068), (22.5, 61.6396103068))
        make_face()
    extrude(amount=F20_T100_DEPTH)

    split(bisect_by=Plane.XZ.offset(30), keep=Keep.TOP)

    split(bisect_by=Plane.XY.offset(30), keep=Keep.TOP)


with BuildPart() as f1_13:
    add(f1_12.part)

    # F20_t97: cut F20_tool98
    add(f20_tool98.part, mode=Mode.SUBTRACT)


with BuildPart() as f20_tool104:
    # F20_s105 → F20_t106 (new body)
    with BuildSketch(Plane(origin=(33.5355339059, 0, 33.5355339059), x_dir=(0, 1, 0), z_dir=(-0.7071067812, 0, -0.7071067812))):
        with BuildLine():
            ThreePointArc((-22.5, -40.4264068712), (-21.9142135624, -41.8406204336), (-20.5, -42.4264068712))
            Line((-20.5, -42.4264068712), (-22.5, -42.4264068712))
            Line((-22.5, -42.4264068712), (-22.5, -40.4264068712))
        make_face()
    extrude(amount=F20_T106_DEPTH)

    split(bisect_by=Plane.XY.offset(30), keep=Keep.TOP)

    split(bisect_by=Plane.YZ, keep=Keep.BOTTOM)


with BuildPart() as f1_14:
    add(f1_13.part)

    # F20_t103: cut F20_tool104
    add(f20_tool104.part, mode=Mode.SUBTRACT)


with BuildPart() as f20_tool110:
    # F20_s111 → F20_t112 (new body)
    with BuildSketch(Plane(origin=(-3.5355339059, 0, -3.5355339059), x_dir=(0, 1, 0), z_dir=(0.7071067812, 0, 0.7071067812))):
        with BuildLine():
            ThreePointArc((-9.5, 42.4264068712), (-8.0857864376, 41.8406204336), (-7.5, 40.4264068712))
            Line((-7.5, 40.4264068712), (-7.5, 42.4264068712))
            Line((-7.5, 42.4264068712), (-9.5, 42.4264068712))
        make_face()
    extrude(amount=F20_T112_DEPTH)

    split(bisect_by=Plane.XY.offset(30), keep=Keep.TOP)

    split(bisect_by=Plane.YZ, keep=Keep.BOTTOM)


with BuildPart() as f1_15:
    add(f1_14.part)

    # F20_t109: cut F20_tool110
    add(f20_tool110.part, mode=Mode.SUBTRACT)


with BuildPart() as f20_tool116:
    # F20_s117 → F20_t118 (new body)
    with BuildSketch(Plane(origin=(-3.5355339059, 3.5355339059, 0), x_dir=(0, 0, 1), z_dir=(0.7071067812, -0.7071067812, 0))):
        with BuildLine():
            ThreePointArc((22.5, 40.4264068712), (21.9142135624, 41.8406204336), (20.5, 42.4264068712))
            Line((20.5, 42.4264068712), (22.5, 42.4264068712))
            Line((22.5, 42.4264068712), (22.5, 40.4264068712))
        make_face()
    extrude(amount=F20_T118_DEPTH)

    split(bisect_by=Plane.YZ, keep=Keep.BOTTOM)

    split(bisect_by=Plane.XZ.offset(30), keep=Keep.TOP)


with BuildPart() as f1_16:
    add(f1_15.part)

    # F20_t115: cut F20_tool116
    add(f20_tool116.part, mode=Mode.SUBTRACT)


with BuildPart() as f20_tool122:
    # F20_s123 → F20_t124 (new body)
    with BuildSketch(Plane(origin=(33.5355339059, -33.5355339059, 0), x_dir=(0, 0, 1), z_dir=(-0.7071067812, 0.7071067812, 0))):
        with BuildLine():
            ThreePointArc((9.5, -42.4264068712), (8.0857864376, -41.8406204336), (7.5, -40.4264068712))
            Line((7.5, -40.4264068712), (7.5, -42.4264068712))
            Line((7.5, -42.4264068712), (9.5, -42.4264068712))
        make_face()
    extrude(amount=F20_T124_DEPTH)

    split(bisect_by=Plane.YZ, keep=Keep.BOTTOM)

    split(bisect_by=Plane.XZ.offset(30), keep=Keep.TOP)


with BuildPart() as f1_17:
    add(f1_16.part)

    # F20_t121: cut F20_tool122
    add(f20_tool122.part, mode=Mode.SUBTRACT)


with BuildPart() as f20_tool129:
    # F20_s130 → F20_t131 (new body)
    with BuildSketch(Plane.XZ.offset(63)):
        with BuildLine():
            ThreePointArc((30, 28), (29.4142135624, 29.4142135624), (28, 30))
            Line((28, 30), (30, 30))
            Line((30, 30), (30, 28))
        make_face()
    extrude(amount=-F20_T131_DEPTH)

    split(bisect_by=Plane.XZ.offset(30), keep=Keep.BOTTOM)


with BuildPart() as f20_tool133:
    # F20_s134 → F20_t135 (new body)
    with BuildSketch(Plane.XY.offset(25)):
        with BuildLine():
            ThreePointArc((30, -28), (29.4142135624, -29.4142135624), (28, -30))
            Line((28, -30), (30, -30))
            Line((30, -30), (30, -28))
        make_face()
    extrude(amount=F20_T135_DEPTH)

    split(bisect_by=Plane.XY.offset(30), keep=Keep.BOTTOM)


with BuildPart() as f20_tool129_1:
    add(f20_tool129.part)

    # F20_t137: intersect F20_tool133
    add(f20_tool133.part, mode=Mode.INTERSECT)


with BuildPart() as f1_18:
    add(f1_17.part)

    # F20_t127: cut F20_tool129
    add(f20_tool129_1.part, mode=Mode.SUBTRACT)


with BuildPart() as f20_tool140:
    # F20_s141 → F20_t142 (new body)
    with BuildSketch(Plane.XZ.offset(25)):
        with BuildLine():
            ThreePointArc((0, 2), (0.5857864376, 0.5857864376), (2, 0))
            Line((2, 0), (0, 0))
            Line((0, 0), (0, 2))
        make_face()
    extrude(amount=F20_T142_DEPTH)

    split(bisect_by=Plane.XZ.offset(30), keep=Keep.BOTTOM)


with BuildPart() as f20_tool144:
    # F20_s145 → F20_t146 (new body)
    with BuildSketch(Plane.YZ.offset(-33)):
        with BuildLine():
            ThreePointArc((-30, 2), (-29.4142135624, 0.5857864376), (-28, 0))
            Line((-28, 0), (-30, 0))
            Line((-30, 0), (-30, 2))
        make_face()
    extrude(amount=F20_T146_DEPTH)

    split(bisect_by=Plane.YZ, keep=Keep.TOP)


with BuildPart() as f20_tool140_1:
    add(f20_tool140.part)

    # F20_t148: intersect F20_tool144
    add(f20_tool144.part, mode=Mode.INTERSECT)


with BuildPart() as f1_19:
    add(f1_18.part)

    # F20_t138: cut F20_tool140
    add(f20_tool140_1.part, mode=Mode.SUBTRACT)


with BuildPart() as f20_tool151:
    # F20_s152 → F20_t153 (new body)
    with BuildSketch(Plane.YZ.offset(5)):
        with BuildLine():
            ThreePointArc((-2, 30), (-0.5857864376, 29.4142135624), (0, 28))
            Line((0, 28), (0, 30))
            Line((0, 30), (-2, 30))
        make_face()
    extrude(amount=-F20_T153_DEPTH)

    split(bisect_by=Plane.YZ, keep=Keep.TOP)


with BuildPart() as f20_tool155:
    # F20_s156 → F20_t157 (new body)
    with BuildSketch(Plane.XY.offset(25)):
        with BuildLine():
            ThreePointArc((0, -2), (0.5857864376, -0.5857864376), (2, 0))
            Line((2, 0), (0, 0))
            Line((0, 0), (0, -2))
        make_face()
    extrude(amount=F20_T157_DEPTH)

    split(bisect_by=Plane.XY.offset(30), keep=Keep.BOTTOM)


with BuildPart() as f20_tool151_1:
    add(f20_tool151.part)

    # F20_t159: intersect F20_tool155
    add(f20_tool155.part, mode=Mode.INTERSECT)


with BuildPart() as f1_20:
    add(f1_19.part)

    # F20_t149: cut F20_tool151
    add(f20_tool151_1.part, mode=Mode.SUBTRACT)

    # F21: fillet of radius 2 on 2 edges, made by hand

    # F21_s2 → F21_t1 (cut)
    with BuildSketch(Plane.XY.offset(30)):
        with BuildLine():
            ThreePointArc((0, -28), (0.5857864376, -29.4142135624), (2, -30))
            Line((2, -30), (0, -30))
            Line((0, -30), (0, -28))
        make_face()
    extrude(amount=F21_T1_DEPTH, mode=Mode.SUBTRACT)

    # F21_s4 → F21_t3 (cut)
    with BuildSketch(Plane.XZ.offset(30)):
        with BuildLine():
            ThreePointArc((0, 28), (0.5857864376, 29.4142135624), (2, 30))
            Line((2, 30), (0, 30))
            Line((0, 30), (0, 28))
        make_face()
    extrude(amount=F21_T3_DEPTH, mode=Mode.SUBTRACT)


with BuildPart() as f21_tool6:
    # F21_s7 → F21_t8 (new body)
    with BuildSketch(Plane.YZ.offset(2)):
        with Locations((-64, 29)):
            Rectangle(F21_S7_W, F21_S7_H)
    extrude(amount=-F21_T8_DEPTH)

    # F21_s9 → F21_t10 (revolve, cut)
    with BuildSketch(Plane(origin=(2, -63, 28), x_dir=(0, 0.7071067812, -0.7071067812), z_dir=(0, 0.7071067812, 0.7071067812))):
        with BuildLine():
            ThreePointArc((0, -2), (2, 0), (0, 2))
            Line((0, 2), (0, -2))
        make_face()
    revolve(axis=Axis((2, -63, 28), (-1, 0, 0)), mode=Mode.SUBTRACT)


with BuildPart() as f1_21:
    add(f1_20.part)

    # F21_t5: cut F21_tool6
    add(f21_tool6.part, mode=Mode.SUBTRACT)


with BuildPart() as f21_tool12:
    # F21_s13 → F21_t14 (new body)
    with BuildSketch(Plane.YZ.offset(2)):
        with Locations((-29, 64)):
            Rectangle(F21_S13_W, F21_S13_H)
    extrude(amount=-F21_T14_DEPTH)

    # F21_s15 → F21_t16 (revolve, cut)
    with BuildSketch(Plane(origin=(2, -28, 63), x_dir=(0, 0.7071067812, -0.7071067812), z_dir=(0, 0.7071067812, 0.7071067812))):
        with BuildLine():
            ThreePointArc((0, -2), (2, 0), (0, 2))
            Line((0, 2), (0, -2))
        make_face()
    revolve(axis=Axis((2, -28, 63), (-1, 0, 0)), mode=Mode.SUBTRACT)


with BuildPart() as f1_22:
    add(f1_21.part)

    # F21_t11: cut F21_tool12
    add(f21_tool12.part, mode=Mode.SUBTRACT)


with BuildPart() as f21_tool19:
    # F21_s20 → F21_t21 (new body)
    with BuildSketch(Plane.XZ.offset(63)):
        with BuildLine():
            ThreePointArc((0, 28), (0.5857864376, 29.4142135624), (2, 30))
            Line((2, 30), (0, 30))
            Line((0, 30), (0, 28))
        make_face()
    extrude(amount=-F21_T21_DEPTH)

    split(bisect_by=Plane.XZ.offset(30), keep=Keep.BOTTOM)

    # F21_s23 → F21_t24 (cut, symmetric)
    with BuildSketch(Plane.YZ.offset(1)):
        with Locations((-28.0000000001, 28.0000000001)):
            Circle(F21_S23_R)
    extrude(amount=F21_T24_DEPTH, both=True, mode=Mode.SUBTRACT)


with BuildPart() as f21_tool25:
    # F21_s26 → F21_t27 (new body)
    with BuildSketch(Plane.XY.offset(63)):
        with BuildLine():
            ThreePointArc((0, -28), (0.5857864376, -29.4142135624), (2, -30))
            Line((2, -30), (0, -30))
            Line((0, -30), (0, -28))
        make_face()
    extrude(amount=-F21_T27_DEPTH)

    # F21_s28 → F21_t29 (cut, symmetric)
    with BuildSketch(Plane.YZ.offset(1)):
        with Locations((-28.0000000001, 28.0000000001)):
            Circle(F21_S28_R)
    extrude(amount=F21_T29_DEPTH, both=True, mode=Mode.SUBTRACT)

    split(bisect_by=Plane.XY.offset(30), keep=Keep.BOTTOM)


with BuildPart() as f21_tool19_1:
    add(f21_tool19.part)

    # F21_t31: intersect F21_tool25
    add(f21_tool25.part, mode=Mode.INTERSECT)


with BuildPart() as f1_23:
    add(f1_22.part)

    # F21_t17: cut F21_tool19
    add(f21_tool19_1.part, mode=Mode.SUBTRACT)


solid = f1_23.part
